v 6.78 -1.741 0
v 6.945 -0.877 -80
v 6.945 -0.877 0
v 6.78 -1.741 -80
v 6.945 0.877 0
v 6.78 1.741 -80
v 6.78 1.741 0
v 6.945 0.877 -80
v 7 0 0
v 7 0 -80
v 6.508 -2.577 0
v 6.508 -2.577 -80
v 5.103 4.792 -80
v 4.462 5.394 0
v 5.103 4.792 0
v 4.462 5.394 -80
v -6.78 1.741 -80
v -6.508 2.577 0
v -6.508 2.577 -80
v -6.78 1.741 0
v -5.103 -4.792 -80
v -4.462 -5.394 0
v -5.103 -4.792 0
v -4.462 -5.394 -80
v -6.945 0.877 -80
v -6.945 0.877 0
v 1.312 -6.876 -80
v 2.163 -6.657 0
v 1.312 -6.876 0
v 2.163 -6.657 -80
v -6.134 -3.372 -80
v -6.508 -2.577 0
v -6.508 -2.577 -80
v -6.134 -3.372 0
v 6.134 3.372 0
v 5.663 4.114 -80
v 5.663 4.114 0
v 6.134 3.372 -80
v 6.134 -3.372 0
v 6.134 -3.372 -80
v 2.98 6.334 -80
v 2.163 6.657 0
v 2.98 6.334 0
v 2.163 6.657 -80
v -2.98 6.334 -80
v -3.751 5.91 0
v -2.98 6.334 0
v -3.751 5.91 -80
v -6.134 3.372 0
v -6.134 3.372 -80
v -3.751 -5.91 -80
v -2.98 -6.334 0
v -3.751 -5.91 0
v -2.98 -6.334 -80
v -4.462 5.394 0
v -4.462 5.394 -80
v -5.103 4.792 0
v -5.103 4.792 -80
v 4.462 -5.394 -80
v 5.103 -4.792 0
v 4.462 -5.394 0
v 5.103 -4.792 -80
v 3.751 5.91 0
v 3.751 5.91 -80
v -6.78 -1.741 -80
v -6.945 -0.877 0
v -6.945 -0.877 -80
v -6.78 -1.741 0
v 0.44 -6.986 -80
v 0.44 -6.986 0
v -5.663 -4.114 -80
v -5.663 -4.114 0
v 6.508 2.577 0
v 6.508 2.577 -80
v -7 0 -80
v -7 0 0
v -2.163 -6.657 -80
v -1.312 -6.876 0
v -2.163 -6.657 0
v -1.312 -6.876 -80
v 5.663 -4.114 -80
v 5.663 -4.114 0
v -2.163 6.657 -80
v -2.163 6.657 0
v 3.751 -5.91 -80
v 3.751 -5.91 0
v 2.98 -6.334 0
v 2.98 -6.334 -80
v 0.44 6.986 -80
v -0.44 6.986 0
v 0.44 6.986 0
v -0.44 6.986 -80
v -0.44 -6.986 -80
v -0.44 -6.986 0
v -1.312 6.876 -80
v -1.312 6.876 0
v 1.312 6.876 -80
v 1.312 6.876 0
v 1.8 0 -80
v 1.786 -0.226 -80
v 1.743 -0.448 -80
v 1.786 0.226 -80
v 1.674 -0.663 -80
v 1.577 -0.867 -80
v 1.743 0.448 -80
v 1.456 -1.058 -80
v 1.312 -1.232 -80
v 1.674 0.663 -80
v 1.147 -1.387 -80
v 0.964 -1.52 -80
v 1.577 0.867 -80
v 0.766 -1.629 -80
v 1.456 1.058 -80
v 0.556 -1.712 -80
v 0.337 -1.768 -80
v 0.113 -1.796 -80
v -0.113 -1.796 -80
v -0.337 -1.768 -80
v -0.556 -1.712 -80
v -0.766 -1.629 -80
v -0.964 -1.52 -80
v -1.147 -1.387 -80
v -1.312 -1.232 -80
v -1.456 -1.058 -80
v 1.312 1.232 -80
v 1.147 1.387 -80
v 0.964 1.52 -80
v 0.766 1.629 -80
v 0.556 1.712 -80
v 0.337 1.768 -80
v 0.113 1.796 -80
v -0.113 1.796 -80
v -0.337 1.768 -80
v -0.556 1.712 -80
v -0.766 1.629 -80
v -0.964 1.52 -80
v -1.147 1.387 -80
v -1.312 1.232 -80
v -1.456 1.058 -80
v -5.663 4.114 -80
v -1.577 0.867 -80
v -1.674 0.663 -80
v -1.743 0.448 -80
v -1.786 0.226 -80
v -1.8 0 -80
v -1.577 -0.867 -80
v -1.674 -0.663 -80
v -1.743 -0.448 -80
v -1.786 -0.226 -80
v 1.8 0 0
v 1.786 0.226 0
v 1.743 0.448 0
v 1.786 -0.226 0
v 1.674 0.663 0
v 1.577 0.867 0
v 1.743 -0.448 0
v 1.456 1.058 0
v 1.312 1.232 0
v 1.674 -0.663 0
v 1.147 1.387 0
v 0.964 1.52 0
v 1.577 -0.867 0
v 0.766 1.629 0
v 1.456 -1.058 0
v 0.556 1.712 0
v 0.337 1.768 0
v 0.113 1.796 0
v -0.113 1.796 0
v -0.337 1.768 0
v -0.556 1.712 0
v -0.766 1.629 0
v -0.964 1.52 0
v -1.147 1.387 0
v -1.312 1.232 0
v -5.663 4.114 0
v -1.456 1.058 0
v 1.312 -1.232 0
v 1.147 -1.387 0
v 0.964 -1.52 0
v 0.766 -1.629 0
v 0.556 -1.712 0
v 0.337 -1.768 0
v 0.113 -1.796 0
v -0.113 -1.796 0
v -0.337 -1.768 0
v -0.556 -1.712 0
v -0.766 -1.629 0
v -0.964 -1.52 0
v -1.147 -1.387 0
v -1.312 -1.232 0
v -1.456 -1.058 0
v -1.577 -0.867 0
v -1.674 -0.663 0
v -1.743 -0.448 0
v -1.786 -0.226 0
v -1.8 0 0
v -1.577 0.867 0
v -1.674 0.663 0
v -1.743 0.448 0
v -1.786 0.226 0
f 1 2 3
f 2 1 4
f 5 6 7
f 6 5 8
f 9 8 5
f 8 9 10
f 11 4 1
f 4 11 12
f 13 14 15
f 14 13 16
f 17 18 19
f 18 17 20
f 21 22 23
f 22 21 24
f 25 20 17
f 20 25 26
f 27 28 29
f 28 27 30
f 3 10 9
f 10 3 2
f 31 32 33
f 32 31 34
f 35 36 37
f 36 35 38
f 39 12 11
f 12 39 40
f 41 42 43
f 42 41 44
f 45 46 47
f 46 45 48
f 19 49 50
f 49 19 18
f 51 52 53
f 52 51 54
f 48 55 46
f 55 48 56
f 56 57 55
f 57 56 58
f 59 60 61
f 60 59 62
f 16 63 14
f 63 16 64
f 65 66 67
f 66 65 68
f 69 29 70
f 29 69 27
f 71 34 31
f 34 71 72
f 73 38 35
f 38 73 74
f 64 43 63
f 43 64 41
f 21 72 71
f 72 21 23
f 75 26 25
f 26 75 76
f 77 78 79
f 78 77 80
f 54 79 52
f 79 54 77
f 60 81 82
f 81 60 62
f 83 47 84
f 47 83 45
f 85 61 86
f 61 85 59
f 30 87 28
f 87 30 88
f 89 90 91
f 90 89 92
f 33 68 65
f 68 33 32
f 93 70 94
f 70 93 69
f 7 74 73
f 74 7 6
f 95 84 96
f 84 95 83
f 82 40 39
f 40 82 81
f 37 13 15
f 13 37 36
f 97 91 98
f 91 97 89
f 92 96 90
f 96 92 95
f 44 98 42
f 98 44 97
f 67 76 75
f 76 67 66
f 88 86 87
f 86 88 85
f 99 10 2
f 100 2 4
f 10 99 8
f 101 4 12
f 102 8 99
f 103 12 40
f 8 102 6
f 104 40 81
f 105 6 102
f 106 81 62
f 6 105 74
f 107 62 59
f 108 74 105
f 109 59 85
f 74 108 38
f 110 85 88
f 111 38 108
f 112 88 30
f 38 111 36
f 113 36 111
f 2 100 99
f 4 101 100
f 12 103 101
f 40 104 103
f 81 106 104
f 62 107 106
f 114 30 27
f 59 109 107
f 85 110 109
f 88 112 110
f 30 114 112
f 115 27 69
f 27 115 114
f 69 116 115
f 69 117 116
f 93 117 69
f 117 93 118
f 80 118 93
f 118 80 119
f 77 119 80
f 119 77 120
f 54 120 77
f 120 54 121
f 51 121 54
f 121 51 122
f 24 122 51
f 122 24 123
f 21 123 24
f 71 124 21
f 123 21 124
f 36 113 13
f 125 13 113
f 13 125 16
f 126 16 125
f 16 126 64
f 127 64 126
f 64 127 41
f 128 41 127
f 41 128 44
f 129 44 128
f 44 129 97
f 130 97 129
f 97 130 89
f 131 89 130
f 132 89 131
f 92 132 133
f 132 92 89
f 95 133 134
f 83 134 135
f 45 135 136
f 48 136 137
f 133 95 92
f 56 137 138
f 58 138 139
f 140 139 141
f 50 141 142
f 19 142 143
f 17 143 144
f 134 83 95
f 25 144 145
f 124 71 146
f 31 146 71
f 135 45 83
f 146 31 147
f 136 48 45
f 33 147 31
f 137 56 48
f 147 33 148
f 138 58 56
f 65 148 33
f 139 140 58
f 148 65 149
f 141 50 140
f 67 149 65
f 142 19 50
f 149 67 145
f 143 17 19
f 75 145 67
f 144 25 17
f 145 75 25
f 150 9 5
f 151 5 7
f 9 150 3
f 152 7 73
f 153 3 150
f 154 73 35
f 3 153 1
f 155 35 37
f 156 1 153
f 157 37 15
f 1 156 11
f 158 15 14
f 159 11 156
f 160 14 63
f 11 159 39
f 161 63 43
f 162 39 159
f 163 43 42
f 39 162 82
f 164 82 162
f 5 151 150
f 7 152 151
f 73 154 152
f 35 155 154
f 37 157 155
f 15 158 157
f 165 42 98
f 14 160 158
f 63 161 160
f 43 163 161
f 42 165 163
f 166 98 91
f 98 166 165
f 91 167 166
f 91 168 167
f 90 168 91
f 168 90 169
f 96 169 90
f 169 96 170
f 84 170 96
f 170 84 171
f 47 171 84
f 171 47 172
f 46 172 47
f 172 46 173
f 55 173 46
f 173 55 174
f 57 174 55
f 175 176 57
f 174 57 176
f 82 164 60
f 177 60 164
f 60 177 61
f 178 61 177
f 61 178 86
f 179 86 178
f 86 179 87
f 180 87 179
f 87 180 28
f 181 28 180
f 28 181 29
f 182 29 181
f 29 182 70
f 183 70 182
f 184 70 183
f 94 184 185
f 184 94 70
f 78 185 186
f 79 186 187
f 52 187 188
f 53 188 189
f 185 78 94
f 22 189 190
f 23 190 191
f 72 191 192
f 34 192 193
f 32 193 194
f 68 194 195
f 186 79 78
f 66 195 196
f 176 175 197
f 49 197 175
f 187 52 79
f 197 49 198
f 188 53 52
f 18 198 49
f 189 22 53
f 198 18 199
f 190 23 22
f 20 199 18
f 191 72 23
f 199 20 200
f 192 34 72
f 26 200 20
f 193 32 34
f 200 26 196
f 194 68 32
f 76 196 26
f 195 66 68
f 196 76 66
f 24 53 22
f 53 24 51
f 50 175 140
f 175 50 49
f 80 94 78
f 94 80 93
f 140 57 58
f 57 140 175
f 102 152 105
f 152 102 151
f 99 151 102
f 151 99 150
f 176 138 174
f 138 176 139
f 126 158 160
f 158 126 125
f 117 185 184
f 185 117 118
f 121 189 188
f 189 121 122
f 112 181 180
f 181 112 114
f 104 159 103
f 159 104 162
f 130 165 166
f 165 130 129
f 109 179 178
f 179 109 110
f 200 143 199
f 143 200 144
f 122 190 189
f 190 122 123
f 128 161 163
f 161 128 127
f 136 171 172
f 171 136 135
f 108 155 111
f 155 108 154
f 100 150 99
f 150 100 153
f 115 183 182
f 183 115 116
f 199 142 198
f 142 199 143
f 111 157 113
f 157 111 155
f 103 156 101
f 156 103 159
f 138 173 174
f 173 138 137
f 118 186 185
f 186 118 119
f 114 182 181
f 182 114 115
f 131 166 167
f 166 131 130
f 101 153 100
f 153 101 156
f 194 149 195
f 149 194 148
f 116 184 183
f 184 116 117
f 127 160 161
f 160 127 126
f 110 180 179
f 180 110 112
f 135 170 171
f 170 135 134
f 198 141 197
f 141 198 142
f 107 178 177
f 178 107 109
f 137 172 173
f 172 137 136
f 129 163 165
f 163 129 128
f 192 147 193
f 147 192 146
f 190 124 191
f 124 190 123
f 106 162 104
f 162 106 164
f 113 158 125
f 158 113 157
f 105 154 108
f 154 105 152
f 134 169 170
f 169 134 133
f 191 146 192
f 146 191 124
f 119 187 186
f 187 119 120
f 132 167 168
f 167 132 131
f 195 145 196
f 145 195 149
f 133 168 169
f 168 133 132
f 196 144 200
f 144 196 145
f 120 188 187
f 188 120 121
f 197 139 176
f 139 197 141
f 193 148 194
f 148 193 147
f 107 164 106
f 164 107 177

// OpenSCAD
$fn = 50;


difference() {
	union() {
		translate(v = [0, 0, -80.0000000000]) {
			cylinder(h = 80, r = 7.0000000000);
		}
		cylinder(h = 0, r = 17.0000000000);
	}
	union() {
		#translate(v = [0, 0, -80]) {
			cylinder(h = 80, r = 1.8000000000);
		}
	}
}
